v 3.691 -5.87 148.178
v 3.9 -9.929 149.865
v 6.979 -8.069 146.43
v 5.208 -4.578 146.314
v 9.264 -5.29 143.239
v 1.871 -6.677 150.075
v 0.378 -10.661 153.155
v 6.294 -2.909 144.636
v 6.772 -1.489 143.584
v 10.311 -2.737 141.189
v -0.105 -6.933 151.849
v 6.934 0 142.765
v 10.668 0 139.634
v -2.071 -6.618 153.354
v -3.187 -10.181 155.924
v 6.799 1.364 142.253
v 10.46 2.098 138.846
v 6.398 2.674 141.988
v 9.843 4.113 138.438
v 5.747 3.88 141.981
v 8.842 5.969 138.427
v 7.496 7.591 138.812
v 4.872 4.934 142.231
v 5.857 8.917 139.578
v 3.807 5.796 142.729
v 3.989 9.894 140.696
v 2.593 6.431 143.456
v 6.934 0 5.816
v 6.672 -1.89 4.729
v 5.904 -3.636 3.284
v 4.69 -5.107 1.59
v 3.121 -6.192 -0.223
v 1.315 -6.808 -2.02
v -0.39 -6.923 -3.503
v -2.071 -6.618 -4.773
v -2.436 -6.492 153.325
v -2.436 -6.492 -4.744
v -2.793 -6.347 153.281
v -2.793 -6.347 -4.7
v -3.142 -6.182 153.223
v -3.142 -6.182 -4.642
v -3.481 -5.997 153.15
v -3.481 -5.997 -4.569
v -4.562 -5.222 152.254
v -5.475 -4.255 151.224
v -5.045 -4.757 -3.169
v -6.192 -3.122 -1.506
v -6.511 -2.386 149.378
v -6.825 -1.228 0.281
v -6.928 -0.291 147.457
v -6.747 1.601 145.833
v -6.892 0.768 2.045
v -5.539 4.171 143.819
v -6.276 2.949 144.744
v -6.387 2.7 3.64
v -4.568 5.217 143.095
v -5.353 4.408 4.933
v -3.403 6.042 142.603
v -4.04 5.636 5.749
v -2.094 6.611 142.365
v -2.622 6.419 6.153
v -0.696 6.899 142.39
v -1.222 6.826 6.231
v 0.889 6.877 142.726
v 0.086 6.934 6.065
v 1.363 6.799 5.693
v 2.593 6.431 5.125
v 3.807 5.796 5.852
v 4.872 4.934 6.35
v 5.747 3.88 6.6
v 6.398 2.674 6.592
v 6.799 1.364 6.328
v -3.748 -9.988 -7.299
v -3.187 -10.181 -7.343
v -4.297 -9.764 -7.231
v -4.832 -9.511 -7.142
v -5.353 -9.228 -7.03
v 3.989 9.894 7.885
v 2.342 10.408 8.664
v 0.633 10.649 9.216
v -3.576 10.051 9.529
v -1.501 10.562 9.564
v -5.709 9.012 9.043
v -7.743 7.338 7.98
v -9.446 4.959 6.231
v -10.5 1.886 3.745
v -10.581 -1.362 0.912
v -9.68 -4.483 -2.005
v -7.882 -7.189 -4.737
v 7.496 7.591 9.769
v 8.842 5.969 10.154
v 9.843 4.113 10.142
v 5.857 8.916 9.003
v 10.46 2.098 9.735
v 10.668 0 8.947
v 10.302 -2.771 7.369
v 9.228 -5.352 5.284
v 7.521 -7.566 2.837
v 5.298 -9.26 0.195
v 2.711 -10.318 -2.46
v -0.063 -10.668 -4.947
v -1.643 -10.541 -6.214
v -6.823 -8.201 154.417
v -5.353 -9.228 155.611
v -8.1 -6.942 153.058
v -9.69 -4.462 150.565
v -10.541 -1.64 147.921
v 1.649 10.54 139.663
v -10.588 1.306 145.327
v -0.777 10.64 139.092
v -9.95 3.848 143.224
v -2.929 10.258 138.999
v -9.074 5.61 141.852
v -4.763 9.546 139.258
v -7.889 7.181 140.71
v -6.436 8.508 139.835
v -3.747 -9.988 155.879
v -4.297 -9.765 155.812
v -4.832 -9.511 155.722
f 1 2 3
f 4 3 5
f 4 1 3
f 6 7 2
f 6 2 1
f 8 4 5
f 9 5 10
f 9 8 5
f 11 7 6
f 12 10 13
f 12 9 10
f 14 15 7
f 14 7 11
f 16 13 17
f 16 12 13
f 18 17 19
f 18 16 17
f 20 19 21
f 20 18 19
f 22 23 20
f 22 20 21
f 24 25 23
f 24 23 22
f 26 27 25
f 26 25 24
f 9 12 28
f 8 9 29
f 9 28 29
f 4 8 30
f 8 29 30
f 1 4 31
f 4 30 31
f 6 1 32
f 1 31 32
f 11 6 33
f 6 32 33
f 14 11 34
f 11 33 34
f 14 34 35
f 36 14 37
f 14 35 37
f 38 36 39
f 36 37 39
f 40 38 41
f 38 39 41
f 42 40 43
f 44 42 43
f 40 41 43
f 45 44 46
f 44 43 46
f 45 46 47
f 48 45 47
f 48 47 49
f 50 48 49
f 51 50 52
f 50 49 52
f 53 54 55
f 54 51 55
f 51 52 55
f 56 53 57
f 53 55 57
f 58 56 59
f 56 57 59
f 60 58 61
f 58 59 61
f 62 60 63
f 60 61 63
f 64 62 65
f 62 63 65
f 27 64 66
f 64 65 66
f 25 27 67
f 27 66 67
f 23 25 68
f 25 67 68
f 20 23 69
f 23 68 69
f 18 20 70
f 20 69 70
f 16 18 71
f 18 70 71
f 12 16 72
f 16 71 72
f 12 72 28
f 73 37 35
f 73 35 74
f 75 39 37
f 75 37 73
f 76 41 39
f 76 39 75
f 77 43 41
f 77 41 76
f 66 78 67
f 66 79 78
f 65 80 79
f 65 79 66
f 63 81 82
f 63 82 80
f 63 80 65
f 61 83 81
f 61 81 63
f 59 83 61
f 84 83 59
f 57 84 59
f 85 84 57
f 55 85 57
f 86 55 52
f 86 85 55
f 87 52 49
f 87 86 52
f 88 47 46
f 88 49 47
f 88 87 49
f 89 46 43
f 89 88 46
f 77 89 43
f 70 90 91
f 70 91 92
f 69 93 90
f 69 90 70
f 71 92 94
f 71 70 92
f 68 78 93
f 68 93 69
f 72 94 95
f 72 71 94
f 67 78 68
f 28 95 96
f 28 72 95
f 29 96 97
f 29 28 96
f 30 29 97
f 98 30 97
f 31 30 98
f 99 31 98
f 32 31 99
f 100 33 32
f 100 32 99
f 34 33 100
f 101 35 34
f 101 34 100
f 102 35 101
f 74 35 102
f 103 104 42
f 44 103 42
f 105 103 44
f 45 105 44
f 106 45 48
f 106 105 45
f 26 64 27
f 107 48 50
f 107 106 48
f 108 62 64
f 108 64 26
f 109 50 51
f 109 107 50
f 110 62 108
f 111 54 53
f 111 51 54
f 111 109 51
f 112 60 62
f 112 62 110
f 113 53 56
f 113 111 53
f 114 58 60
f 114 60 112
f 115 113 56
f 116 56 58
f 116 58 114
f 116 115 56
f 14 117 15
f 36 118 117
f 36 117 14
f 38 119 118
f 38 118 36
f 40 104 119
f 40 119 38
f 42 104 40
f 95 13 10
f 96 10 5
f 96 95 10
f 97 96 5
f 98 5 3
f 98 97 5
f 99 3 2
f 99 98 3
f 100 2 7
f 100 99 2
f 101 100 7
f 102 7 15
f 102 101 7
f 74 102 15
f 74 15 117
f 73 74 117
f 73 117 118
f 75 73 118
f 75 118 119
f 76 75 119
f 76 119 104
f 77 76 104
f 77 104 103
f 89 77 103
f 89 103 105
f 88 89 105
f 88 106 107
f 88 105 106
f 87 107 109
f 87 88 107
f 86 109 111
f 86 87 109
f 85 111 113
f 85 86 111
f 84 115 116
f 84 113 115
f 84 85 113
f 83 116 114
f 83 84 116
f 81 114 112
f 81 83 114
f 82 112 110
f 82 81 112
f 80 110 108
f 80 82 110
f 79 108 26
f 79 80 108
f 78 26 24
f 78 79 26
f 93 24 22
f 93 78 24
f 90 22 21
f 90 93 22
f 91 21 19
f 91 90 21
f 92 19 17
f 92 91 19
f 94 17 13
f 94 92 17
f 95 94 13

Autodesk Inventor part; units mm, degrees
ref_plane "Start Plane" through (0, 0, -7.3433) normal (0, 0, 1) x (1, 0, 0)
ref_plane "End Plane" through (0, 0, 155.9241) normal (0, 0, 1) x (1, 0, 0)
sketch "Sketch" plane through (0, 0, 0) normal (0, 0, 1) x (1, 0, 0)
  circle A0 centre (0, 0) radius 6.9342
  circle A1 centre (0, 0) radius 10.668
  dimension "d0" = 21.336
  dimension "d1" = 3.7338
extrude "Body" add sketch "Sketch" along normal up to surface (163.2675 mm away) from surface at -7.3433
sketch "Sketch3" plane through (0, 0, 0) normal (0, 0, 1) x (1, 0, 0)
  line L0 (0, 0) -> (10, 0)
ref_plane "Work Plane3" through (0, 0, 0) normal (0, -1, 0) x (1, 0, 0)
sketch "Sketch4" plane through (0, 0, 0) normal (0, -1, 0) x (1, 0, 0)
  line L0 (-2, -7.3433) -> (12, -7.3433)
  line L1 (-2, 155.9241) -> (12, 155.9241)
  dimension "d7" = 163.2675
ref_plane "Work Plane4" through (-9.359, -5.1201, 158.779) normal (0.6062, 0.3316, 0.7228) x (0.7867, -0.1167, -0.6062)
split "Split1" plane through (-9.359, -5.1201, 158.779) removes the side toward (0.6062, 0.3316, 0.7228)
ref_plane "Work Plane5" through (-2.3452, -10.407, 155.9487) normal (0.1249, 0.5544, 0.8228) x (0.9914, -0.038, -0.1249)
split "Split2" plane through (-2.3452, -10.407, 155.9487) removes the side toward (0.1249, 0.5544, 0.8228)
ref_plane "Work Plane6" through (2.3628, -10.403, 158.1791) normal (-0.1481, 0.6522, 0.7434) x (0.9874, 0.0554, 0.1481)
split "Split3" plane through (2.3628, -10.403, 158.1791) removes the side toward (-0.1481, 0.6522, 0.7434)
ref_plane "Work Plane7" through (-9.359, -5.12, -10.1982) normal (0.6062, 0.3316, -0.7228) x (-0.326, -0.7254, -0.6062)
split "Split4" plane through (-9.359, -5.12, -10.1982) removes the side toward (0.6062, 0.3316, -0.7228)
ref_plane "Work Plane8" through (-2.3452, -10.407, -7.3679) normal (0.1249, 0.5544, -0.8228) x (0.9119, -0.3909, -0.1249)
split "Split5" plane through (-2.3452, -10.407, -7.3679) removes the side toward (0.1249, 0.5544, -0.8228)
ref_plane "Work Plane9" through (2.3628, -10.403, -9.5983) normal (-0.1481, 0.6522, -0.7434) x (0.9145, 0.3765, 0.1481)
split "Split6" plane through (2.3628, -10.403, -9.5983) removes the side toward (-0.1481, 0.6522, -0.7434)
equation "\"d0\" = G_H"
equation "\"d1\" = G_T"
equation "\"d2\" = G_L"
equation "\"G_H\" = 21.336"
equation "\"G_T\" = 3.7338"
equation "\"G_L\" = 163.26749"
equation "\"G_OFFSET_START\" = 7.34335"
equation "\"G_OFFSET_END\" = 7.34335"
equation "\"d4\" = -G_OFFSET_START"
equation "\"d5\" = G_OFFSET_END + B_L"
equation "\"B_L\" = 148.5808"
properties part number "ANSI - 1/2 x 0.147 - 6.428" material "Steel, Mild"
